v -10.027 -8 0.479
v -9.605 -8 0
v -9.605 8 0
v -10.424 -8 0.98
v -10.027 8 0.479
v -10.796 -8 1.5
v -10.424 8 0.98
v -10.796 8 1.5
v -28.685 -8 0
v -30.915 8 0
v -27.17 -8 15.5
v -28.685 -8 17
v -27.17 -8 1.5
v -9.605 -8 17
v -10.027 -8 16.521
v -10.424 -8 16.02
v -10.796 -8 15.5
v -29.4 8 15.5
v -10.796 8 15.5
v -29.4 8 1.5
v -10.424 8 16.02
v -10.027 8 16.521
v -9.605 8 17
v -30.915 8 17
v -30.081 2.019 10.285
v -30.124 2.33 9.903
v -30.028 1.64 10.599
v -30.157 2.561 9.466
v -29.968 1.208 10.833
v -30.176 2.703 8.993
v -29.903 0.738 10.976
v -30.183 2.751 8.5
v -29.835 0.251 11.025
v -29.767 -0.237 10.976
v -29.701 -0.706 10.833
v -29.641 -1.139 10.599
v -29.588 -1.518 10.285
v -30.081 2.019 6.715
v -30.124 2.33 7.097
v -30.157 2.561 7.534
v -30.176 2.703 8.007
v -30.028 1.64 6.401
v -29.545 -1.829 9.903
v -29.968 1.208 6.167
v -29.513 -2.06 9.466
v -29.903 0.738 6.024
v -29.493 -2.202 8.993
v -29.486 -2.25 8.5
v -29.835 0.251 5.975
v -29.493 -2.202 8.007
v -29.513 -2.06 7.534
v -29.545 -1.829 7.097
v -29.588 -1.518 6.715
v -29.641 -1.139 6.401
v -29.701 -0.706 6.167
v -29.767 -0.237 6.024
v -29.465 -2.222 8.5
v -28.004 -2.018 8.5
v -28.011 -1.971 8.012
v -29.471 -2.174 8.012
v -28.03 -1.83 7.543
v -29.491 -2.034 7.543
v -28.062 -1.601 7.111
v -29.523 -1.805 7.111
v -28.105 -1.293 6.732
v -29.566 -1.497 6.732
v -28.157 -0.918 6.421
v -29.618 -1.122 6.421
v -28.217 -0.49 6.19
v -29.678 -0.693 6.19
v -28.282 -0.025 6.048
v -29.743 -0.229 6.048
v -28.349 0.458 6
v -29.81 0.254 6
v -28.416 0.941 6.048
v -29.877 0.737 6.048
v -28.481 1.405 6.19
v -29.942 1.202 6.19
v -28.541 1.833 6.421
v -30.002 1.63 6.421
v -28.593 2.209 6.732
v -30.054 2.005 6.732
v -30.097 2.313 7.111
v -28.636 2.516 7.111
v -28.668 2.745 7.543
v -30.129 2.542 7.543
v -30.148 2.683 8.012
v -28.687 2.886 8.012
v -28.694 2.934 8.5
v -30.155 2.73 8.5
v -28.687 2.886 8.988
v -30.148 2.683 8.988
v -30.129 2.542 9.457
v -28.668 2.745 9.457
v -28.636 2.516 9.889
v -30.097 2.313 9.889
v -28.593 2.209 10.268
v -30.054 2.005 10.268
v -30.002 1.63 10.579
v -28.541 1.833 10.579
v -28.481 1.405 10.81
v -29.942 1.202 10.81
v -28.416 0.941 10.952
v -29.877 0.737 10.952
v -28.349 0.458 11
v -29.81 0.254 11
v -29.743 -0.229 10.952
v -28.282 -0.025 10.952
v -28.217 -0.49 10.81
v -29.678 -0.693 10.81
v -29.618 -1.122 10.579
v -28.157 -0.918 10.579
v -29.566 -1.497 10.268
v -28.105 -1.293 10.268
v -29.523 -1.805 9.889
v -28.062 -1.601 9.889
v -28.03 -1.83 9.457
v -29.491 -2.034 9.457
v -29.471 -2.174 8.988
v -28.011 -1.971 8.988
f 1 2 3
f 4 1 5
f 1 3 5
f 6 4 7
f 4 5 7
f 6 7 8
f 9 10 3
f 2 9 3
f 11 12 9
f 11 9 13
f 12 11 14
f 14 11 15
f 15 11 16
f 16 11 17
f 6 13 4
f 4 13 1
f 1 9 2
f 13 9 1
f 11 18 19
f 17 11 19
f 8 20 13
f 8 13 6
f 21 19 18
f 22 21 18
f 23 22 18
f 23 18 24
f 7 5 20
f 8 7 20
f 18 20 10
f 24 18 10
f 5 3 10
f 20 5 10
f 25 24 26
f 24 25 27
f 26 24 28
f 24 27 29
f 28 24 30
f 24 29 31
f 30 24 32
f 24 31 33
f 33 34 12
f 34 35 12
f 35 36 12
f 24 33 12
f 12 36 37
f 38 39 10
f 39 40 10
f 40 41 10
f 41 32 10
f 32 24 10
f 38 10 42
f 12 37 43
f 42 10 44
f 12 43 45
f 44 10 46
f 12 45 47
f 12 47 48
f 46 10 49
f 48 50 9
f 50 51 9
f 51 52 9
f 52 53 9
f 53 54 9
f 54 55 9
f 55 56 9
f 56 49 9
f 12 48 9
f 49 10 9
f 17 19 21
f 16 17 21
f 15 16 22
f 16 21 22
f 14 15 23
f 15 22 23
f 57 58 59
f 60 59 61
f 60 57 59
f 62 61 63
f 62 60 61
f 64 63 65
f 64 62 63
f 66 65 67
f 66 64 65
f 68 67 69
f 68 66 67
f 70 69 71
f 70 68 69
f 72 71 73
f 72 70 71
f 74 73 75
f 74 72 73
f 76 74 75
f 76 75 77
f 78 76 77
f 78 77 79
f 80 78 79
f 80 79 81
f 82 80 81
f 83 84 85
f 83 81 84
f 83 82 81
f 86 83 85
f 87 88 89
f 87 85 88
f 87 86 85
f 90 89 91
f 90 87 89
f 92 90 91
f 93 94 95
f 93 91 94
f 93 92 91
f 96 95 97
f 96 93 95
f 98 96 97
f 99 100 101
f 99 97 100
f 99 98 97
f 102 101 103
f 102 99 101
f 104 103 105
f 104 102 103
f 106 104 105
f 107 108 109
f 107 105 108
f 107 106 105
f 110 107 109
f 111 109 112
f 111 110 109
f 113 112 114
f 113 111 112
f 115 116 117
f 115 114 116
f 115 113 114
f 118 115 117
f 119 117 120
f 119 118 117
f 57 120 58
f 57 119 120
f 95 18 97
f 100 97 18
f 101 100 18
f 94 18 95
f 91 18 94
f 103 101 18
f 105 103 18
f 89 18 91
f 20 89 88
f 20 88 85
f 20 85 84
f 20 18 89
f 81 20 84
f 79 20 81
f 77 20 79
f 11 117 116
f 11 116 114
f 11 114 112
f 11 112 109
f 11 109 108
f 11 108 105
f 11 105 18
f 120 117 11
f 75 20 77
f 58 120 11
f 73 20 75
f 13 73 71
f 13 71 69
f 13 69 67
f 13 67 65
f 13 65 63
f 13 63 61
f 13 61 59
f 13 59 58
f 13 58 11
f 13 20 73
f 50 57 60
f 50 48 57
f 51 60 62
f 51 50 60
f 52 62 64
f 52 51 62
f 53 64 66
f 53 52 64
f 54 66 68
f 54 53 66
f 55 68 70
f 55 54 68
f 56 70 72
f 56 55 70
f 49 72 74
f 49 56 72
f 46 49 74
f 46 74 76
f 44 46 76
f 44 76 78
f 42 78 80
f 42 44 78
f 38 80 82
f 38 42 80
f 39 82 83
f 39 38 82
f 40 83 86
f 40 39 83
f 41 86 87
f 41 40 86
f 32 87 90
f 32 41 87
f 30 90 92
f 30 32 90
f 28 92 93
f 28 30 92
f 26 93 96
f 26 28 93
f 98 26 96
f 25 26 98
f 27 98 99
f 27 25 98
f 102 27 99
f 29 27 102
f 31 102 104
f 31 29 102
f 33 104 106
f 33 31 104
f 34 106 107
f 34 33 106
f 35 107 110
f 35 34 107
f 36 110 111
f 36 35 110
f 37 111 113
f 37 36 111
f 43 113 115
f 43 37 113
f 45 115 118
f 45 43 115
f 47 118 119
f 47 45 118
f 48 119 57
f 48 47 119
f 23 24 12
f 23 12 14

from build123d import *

# Parameters (mm, degrees)
DODANIE_WYCI_GNI_CIE1_DEPTH = 17
SKORUPA2_T                  = -1.5
SZKIC5_R                    = 12.5
WYTNIJ_WYCI_GNI_CIE1_DEPTH  = 17


with BuildPart() as part:
    # Szkic1 → Dodanie-wyciągnięcie1 (new body)
    with BuildSketch(Plane.XY):
        Polygon((-9.604686356, 8), (-30.914686356, 8), (-28.684686356, -8), (-9.604686356, -8), align=None)
    extrude(amount=DODANIE_WYCI_GNI_CIE1_DEPTH)

    # Skorupa2
    skorupa2_openings = [part.faces().sort_by_distance(p)[0] for p in [
        (-19.144686356, -8, 8.5),
        (-20.259686356, 8, 8.5),
        (-9.604686356, 0, 8.5),
    ]]
    offset(amount=SKORUPA2_T, openings=skorupa2_openings, kind=Kind.INTERSECTION)

    # Szkic3 → Pogłębienie walcowe pod M2 Śrubę z łbem stożkowym ściętym1 (revolve, cut)
    with BuildSketch(Plane(origin=(-29.834614332, 0.250604313, 8.5), x_dir=(0.138040701, -0.990426557, 0), z_dir=(0, 0, 1))):
        Polygon((0, 0), (0, 10.721032743), (1.2, 10), (1.2, 1.6), (2.5, 1.6), (2.5, 0.025), (2.525, 0), align=None)
    revolve(axis=Axis((-36.123822969, -0.625954141, 8.5), (0.990426557, 0.138040701, 0)), mode=Mode.SUBTRACT)

    # Szkic5 → Wytnij-wyciągnięcie1 (cut)
    with BuildSketch(Plane(origin=(0, 8, 0), x_dir=(1, 0, 0), z_dir=(0, 1, 0))):
        with Locations((-0.439534966, -8.5)):
            Circle(SZKIC5_R)
    extrude(amount=-WYTNIJ_WYCI_GNI_CIE1_DEPTH, mode=Mode.SUBTRACT)


solid = part.part
